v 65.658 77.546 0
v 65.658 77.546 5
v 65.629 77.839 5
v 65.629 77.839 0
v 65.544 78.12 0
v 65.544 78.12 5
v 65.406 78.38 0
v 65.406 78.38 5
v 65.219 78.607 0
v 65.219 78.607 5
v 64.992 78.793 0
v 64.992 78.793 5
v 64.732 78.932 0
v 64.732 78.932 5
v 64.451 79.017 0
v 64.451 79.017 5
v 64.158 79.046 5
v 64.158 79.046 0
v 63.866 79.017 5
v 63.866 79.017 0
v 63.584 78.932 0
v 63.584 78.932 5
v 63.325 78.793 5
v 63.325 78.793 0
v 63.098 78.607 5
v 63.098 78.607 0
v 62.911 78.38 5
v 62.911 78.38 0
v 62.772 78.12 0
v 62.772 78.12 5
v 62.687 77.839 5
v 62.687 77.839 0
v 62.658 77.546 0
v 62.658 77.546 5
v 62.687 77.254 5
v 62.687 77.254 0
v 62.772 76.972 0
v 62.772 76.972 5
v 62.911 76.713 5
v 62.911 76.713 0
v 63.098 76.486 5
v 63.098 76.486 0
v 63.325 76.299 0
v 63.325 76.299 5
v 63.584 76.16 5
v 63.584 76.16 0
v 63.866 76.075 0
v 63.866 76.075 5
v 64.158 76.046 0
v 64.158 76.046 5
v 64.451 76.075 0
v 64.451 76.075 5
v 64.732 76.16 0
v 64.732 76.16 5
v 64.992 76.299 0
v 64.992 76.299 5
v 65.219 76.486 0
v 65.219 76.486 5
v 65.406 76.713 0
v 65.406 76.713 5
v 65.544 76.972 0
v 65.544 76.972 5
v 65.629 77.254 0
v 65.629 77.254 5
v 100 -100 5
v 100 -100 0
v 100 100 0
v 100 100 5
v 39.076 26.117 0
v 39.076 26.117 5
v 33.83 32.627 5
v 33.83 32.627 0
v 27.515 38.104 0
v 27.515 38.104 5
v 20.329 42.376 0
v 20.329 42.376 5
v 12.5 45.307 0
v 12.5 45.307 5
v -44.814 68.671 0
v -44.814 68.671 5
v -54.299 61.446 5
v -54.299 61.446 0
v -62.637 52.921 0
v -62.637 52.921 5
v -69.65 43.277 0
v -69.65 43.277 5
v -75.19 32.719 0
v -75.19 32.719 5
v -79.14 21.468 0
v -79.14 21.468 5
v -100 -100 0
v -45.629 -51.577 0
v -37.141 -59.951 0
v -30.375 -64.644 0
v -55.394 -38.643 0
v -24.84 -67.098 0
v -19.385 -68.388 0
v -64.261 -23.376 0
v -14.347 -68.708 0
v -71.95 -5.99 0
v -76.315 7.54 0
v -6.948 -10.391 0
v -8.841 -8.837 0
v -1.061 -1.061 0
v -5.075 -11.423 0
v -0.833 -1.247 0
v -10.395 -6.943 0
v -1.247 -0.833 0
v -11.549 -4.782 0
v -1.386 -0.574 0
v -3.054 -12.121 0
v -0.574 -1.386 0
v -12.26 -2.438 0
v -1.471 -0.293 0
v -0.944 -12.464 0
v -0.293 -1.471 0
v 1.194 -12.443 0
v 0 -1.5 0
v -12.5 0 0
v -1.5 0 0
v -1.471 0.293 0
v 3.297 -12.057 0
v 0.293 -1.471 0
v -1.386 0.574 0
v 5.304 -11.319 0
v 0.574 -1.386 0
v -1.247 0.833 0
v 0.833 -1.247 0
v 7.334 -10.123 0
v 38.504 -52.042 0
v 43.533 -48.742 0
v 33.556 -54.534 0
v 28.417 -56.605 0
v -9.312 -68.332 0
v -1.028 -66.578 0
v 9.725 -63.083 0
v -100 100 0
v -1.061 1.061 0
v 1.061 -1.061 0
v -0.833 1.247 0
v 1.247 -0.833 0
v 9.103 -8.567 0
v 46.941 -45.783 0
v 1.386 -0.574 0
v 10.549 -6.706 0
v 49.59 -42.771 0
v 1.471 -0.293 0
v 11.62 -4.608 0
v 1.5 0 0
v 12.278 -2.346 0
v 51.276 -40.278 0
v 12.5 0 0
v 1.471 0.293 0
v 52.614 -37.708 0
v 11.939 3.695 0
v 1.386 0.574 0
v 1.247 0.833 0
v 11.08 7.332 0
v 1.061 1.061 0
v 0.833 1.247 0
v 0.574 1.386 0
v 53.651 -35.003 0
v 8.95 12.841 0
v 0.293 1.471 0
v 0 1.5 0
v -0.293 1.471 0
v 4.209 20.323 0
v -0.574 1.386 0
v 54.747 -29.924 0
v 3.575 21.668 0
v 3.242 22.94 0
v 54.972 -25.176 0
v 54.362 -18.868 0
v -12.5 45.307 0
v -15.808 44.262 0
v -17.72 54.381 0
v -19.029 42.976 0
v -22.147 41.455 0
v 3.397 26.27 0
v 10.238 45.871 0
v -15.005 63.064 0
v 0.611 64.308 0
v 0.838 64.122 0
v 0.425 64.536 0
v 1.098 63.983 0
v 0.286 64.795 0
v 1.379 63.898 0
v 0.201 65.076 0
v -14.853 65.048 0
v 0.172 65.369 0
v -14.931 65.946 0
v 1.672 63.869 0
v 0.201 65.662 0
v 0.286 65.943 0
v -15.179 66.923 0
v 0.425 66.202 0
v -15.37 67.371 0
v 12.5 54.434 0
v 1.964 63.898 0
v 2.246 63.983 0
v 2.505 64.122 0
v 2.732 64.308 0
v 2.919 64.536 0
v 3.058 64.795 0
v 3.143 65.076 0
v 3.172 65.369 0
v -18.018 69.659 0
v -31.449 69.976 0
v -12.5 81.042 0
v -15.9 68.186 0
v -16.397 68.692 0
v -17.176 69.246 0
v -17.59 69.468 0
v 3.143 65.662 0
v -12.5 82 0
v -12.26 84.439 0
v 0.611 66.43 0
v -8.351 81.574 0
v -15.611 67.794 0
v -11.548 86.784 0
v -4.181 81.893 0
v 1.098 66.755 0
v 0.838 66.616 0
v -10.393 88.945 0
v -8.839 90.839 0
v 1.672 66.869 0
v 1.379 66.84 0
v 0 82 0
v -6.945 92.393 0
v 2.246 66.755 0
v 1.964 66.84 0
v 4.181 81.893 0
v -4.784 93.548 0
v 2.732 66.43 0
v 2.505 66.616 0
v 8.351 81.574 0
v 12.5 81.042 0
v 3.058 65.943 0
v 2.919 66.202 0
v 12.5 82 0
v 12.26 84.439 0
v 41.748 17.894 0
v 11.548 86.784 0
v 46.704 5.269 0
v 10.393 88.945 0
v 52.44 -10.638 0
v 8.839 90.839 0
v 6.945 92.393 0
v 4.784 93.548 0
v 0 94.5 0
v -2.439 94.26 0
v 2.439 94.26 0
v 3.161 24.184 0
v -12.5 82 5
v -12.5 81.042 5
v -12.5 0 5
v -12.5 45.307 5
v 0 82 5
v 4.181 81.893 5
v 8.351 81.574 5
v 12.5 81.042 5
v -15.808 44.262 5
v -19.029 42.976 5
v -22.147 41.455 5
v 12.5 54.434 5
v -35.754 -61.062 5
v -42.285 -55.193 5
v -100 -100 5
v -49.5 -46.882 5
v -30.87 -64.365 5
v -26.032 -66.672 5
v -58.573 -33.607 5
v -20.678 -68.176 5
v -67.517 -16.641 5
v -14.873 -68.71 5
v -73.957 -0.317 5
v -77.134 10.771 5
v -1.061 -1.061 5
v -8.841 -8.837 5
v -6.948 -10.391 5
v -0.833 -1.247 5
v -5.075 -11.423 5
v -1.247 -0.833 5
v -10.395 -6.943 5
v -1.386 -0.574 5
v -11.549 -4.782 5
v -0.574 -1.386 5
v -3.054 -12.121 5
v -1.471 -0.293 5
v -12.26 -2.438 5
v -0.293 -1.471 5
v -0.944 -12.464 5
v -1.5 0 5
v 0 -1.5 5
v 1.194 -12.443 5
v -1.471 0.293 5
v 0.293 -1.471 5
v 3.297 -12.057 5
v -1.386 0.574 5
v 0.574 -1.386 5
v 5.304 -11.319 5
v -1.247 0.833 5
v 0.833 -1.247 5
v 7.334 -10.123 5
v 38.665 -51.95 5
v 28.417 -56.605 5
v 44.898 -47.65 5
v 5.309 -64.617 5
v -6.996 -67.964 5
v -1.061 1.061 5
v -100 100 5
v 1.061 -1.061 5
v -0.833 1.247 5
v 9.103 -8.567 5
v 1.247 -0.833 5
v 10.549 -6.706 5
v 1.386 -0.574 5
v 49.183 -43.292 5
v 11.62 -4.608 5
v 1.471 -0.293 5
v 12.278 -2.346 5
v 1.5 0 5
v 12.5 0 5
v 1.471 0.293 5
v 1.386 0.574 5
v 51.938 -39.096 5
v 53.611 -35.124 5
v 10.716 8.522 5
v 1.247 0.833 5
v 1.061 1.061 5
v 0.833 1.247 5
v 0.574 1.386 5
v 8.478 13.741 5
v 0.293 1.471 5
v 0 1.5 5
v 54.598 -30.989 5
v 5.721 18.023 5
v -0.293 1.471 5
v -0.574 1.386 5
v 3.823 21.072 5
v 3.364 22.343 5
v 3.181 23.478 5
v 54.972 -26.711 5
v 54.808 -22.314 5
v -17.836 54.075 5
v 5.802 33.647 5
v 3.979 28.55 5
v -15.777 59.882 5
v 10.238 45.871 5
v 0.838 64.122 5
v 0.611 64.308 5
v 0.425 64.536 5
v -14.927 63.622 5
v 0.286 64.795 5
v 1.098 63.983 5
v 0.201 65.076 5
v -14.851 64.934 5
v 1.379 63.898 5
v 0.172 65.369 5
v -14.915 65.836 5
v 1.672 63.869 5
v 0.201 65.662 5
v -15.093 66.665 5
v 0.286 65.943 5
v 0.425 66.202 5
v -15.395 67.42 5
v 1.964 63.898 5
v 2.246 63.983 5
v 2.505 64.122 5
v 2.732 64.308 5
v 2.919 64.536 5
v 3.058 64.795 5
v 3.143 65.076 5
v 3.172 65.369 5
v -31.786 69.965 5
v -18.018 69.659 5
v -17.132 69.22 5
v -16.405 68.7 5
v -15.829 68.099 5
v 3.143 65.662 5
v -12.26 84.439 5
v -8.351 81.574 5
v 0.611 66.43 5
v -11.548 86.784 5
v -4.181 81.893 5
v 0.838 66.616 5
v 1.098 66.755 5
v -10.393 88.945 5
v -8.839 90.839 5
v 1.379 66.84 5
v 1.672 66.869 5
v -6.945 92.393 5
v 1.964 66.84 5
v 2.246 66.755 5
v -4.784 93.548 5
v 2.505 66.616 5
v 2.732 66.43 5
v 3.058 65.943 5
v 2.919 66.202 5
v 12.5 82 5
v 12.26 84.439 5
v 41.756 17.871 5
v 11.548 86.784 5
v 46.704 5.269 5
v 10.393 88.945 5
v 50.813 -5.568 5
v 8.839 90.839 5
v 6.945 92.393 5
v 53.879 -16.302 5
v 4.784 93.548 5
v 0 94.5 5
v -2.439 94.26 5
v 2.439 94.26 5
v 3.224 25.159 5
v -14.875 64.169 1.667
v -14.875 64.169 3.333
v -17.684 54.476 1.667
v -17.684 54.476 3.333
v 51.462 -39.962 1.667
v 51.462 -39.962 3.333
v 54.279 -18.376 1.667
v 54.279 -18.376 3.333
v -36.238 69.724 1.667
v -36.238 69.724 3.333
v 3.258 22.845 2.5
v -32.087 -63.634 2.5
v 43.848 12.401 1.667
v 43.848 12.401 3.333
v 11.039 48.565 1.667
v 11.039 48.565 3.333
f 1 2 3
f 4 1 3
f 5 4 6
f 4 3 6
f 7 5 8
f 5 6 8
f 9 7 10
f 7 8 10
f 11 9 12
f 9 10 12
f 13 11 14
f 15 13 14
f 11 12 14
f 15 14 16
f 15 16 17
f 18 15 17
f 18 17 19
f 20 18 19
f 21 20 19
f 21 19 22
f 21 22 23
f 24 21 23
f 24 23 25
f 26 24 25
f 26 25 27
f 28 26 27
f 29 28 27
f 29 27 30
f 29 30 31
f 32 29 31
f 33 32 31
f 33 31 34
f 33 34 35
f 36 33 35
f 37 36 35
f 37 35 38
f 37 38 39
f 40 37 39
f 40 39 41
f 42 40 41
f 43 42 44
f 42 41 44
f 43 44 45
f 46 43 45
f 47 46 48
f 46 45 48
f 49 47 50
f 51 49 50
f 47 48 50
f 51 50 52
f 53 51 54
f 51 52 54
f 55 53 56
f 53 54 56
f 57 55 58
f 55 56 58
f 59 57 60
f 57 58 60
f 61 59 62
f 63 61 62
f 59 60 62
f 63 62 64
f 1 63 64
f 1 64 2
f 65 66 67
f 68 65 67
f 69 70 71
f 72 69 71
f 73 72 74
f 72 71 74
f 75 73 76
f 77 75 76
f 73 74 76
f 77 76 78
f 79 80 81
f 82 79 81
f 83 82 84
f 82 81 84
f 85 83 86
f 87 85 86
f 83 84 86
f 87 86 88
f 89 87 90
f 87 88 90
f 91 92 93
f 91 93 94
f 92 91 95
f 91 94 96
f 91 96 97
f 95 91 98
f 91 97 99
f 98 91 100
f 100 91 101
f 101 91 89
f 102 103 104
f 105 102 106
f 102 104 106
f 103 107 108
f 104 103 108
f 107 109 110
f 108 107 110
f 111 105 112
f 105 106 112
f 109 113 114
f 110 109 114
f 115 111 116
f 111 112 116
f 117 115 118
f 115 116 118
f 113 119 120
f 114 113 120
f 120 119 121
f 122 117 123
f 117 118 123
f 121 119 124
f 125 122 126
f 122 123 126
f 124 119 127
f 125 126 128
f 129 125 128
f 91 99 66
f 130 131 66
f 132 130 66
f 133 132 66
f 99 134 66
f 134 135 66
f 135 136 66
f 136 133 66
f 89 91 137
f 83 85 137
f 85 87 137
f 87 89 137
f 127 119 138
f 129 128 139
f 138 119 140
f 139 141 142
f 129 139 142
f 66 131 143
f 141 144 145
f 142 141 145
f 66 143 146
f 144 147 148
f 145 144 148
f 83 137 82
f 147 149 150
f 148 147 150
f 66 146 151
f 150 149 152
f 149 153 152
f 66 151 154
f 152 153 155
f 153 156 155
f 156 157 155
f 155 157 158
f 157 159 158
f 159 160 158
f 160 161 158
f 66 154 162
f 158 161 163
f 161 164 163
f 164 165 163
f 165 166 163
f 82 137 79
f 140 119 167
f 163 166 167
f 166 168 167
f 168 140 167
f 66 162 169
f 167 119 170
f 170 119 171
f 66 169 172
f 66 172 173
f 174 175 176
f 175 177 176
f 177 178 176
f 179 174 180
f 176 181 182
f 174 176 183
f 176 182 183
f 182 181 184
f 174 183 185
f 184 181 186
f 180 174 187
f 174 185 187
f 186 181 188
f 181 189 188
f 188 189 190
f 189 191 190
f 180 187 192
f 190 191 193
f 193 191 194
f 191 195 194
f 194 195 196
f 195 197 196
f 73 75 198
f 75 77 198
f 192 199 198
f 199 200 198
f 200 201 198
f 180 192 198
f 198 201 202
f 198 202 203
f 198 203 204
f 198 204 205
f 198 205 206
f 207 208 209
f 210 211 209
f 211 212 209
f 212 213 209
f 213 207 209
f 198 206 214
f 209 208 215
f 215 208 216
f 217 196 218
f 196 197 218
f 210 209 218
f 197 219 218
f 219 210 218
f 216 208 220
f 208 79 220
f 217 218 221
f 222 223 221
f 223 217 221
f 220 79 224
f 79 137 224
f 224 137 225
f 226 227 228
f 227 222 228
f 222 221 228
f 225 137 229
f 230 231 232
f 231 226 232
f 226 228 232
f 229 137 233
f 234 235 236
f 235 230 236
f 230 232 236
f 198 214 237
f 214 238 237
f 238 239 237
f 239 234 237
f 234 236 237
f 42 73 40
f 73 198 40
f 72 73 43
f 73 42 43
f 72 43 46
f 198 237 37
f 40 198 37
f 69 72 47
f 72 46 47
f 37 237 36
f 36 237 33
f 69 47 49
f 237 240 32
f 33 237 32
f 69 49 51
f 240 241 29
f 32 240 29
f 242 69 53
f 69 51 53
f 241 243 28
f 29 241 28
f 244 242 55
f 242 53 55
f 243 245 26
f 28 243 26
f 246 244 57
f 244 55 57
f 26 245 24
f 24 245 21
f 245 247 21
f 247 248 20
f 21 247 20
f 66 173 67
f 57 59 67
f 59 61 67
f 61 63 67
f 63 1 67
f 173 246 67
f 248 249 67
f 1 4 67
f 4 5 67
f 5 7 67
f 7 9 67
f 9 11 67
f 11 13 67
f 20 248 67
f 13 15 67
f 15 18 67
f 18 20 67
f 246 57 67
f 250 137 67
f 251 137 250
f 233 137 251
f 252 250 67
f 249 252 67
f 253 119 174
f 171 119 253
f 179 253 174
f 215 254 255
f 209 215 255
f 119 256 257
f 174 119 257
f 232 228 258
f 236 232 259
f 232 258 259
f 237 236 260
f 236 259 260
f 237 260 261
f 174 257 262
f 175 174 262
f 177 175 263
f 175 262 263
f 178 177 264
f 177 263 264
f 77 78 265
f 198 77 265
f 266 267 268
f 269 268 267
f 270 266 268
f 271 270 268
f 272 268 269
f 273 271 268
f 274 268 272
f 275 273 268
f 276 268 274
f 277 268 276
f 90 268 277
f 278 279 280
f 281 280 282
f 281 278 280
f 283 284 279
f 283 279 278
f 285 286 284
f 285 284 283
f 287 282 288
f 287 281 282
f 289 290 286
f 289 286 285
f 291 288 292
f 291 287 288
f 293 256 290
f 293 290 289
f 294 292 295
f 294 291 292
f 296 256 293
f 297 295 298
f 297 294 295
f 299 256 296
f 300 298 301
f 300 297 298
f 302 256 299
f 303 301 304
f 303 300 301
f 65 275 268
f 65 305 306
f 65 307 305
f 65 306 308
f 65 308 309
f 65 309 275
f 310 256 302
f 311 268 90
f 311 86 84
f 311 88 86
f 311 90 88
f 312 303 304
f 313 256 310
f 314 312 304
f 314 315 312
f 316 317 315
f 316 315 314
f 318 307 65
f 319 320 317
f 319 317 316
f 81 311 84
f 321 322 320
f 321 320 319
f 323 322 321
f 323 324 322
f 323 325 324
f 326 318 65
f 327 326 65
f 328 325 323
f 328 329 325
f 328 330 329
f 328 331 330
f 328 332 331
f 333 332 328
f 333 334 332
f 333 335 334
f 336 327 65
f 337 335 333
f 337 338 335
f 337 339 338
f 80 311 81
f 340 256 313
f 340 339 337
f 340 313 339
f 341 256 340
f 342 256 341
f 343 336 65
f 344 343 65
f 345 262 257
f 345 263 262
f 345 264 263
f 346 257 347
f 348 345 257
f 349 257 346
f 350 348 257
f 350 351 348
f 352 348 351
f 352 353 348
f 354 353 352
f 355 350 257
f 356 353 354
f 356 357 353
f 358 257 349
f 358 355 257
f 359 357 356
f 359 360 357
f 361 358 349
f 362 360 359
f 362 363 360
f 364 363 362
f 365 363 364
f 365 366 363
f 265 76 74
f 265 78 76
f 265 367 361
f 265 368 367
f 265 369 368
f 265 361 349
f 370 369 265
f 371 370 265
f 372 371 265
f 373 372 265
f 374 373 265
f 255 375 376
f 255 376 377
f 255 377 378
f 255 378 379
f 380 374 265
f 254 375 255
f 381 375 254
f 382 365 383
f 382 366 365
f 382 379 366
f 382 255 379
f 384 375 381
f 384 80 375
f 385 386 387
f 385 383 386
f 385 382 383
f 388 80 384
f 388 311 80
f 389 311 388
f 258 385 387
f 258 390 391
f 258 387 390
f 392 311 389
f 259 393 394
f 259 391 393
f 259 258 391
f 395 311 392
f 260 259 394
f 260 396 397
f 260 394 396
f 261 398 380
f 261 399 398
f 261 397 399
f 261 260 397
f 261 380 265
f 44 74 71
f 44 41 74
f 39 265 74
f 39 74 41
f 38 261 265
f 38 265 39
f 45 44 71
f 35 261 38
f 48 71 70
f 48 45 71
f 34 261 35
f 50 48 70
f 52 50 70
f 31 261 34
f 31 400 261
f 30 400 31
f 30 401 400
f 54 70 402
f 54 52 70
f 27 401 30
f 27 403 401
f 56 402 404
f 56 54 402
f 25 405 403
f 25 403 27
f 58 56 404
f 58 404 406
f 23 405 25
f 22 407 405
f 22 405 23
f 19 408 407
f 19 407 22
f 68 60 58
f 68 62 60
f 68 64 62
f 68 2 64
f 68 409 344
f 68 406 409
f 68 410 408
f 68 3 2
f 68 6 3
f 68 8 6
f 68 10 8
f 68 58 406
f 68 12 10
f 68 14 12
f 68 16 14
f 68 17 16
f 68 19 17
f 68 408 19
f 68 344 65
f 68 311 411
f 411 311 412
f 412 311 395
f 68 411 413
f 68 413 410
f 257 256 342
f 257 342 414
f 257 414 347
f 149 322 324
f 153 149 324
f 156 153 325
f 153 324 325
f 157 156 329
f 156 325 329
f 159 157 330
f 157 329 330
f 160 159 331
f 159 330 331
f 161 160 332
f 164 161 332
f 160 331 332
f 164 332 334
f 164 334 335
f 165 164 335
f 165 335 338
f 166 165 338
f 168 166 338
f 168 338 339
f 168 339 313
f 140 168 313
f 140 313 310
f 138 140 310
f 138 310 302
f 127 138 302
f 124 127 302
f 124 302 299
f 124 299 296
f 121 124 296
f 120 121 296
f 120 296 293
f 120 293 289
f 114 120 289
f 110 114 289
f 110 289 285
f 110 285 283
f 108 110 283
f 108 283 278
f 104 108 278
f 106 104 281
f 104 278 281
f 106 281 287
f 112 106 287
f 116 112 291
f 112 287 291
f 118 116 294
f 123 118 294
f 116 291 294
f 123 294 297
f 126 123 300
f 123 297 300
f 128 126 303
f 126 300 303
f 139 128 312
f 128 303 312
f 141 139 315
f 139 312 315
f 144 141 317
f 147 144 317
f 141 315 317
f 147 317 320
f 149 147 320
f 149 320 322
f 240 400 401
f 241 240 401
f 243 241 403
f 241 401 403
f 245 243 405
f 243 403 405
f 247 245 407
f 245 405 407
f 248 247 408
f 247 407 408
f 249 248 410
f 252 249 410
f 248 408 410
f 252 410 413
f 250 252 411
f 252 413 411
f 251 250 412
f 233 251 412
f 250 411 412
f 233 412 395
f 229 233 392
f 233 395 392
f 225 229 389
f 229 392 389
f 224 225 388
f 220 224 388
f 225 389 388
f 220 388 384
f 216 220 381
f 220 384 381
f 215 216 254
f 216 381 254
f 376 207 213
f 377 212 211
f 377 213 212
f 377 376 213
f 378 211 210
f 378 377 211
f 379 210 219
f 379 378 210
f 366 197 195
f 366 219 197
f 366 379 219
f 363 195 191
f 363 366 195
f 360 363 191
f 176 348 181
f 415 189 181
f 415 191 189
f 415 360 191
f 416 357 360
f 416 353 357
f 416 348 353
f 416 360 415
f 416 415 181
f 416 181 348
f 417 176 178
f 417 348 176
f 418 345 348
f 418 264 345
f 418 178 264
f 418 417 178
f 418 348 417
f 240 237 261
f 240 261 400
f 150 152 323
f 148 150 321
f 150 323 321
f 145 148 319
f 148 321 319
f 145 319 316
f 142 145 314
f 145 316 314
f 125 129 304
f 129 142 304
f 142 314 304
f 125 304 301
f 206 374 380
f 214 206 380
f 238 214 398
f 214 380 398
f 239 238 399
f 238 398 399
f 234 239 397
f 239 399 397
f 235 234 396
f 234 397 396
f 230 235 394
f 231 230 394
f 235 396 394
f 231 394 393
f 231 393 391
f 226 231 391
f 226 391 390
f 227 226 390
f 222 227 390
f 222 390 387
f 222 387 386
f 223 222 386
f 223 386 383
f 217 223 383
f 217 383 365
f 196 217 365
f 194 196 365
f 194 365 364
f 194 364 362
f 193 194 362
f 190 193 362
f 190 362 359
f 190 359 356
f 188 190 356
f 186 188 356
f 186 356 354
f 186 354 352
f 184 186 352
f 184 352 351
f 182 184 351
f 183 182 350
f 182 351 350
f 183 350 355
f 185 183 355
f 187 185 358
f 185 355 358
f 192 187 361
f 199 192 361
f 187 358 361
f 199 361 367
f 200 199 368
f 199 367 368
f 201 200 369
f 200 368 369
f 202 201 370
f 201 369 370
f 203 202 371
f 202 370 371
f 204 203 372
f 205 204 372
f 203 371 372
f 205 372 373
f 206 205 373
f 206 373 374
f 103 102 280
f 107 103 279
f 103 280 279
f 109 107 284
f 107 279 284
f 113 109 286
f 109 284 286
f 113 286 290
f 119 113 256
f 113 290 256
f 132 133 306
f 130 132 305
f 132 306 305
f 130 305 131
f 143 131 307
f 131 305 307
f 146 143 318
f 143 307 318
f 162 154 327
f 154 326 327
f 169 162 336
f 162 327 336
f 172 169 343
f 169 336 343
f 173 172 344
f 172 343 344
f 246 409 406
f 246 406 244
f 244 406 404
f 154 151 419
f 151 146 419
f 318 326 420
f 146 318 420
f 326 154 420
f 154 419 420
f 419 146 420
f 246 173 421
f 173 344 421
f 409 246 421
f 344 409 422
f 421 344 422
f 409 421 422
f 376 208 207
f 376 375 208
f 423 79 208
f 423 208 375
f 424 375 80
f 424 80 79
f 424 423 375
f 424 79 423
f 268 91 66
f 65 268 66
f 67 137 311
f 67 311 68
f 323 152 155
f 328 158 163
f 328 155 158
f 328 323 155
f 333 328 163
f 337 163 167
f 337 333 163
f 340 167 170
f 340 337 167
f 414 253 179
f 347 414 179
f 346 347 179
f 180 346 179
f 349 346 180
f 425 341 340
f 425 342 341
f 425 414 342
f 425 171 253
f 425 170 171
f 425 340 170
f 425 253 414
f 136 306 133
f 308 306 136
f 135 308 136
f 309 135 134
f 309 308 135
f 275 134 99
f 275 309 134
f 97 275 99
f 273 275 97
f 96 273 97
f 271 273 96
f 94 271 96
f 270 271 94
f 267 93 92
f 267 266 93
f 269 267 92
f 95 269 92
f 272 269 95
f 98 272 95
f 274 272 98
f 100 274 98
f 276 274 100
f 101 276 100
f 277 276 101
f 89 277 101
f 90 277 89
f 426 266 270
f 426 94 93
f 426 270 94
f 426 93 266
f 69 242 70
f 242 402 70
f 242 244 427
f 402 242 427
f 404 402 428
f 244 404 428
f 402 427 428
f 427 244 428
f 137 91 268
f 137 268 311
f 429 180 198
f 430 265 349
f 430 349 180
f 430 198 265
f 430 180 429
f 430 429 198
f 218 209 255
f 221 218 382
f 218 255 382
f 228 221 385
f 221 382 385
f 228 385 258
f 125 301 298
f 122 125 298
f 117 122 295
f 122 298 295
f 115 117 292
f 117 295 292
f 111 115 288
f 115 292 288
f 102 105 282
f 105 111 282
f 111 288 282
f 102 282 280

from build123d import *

# Parameters (mm, degrees)
F0_W     = 200
F0_H     = 200
F1_DEPTH = 5
F2_R     = 1.5
F3_DEPTH = 5.001
F4_R     = 1.5
F5_DEPTH = 5.001


# Not quite as in the source:
# - a feature names something its author has since deleted; it is built from what else it names


with BuildPart() as f1:
    # F0 (on Top) → F1 (new body)
    with BuildSketch(Plane.XY):
        Rectangle(F0_W, F0_H)
    extrude(amount=F1_DEPTH)

    # F2 (on face) → F3 (cut, through all)
    with BuildSketch(Plane.XY.offset(5)):
        Circle(F2_R)
        with Locations((0, -63.662)):
            Circle(F2_R)
        with Locations((64.1583176089, 77.5462182691)):
            Circle(F2_R)
        with Locations((-51.9230208324, 31.0114389966)):
            Circle(F2_R)
        with Locations((1.6717778053, 65.3690844774)):
            Circle(F2_R)
    extrude(amount=-F3_DEPTH, mode=Mode.SUBTRACT)

    # F4 (on face) → F5 (cut, through all)
    with BuildSketch(Plane.XY.offset(5)):
        with BuildLine():
            Line((-12.5, 0), (-12.5, 45.3072841826))
            ThreePointArc((-12.5, 45.3072841826), (-17.4301226021, 43.6484916816), (-22.1467463119, 41.4550555156))
            add(Edge.make_bspline(
                [(-22.1467463119, 41.4550555156), (-22.9092474685, 38.6087716354), (-26.7916480004, 19.492616055), (-18.2157949408, -4.2593218119), (-6.9475647742, -10.3914072054)],
                knots=[0.382428707, 0.382428707, 0.382428707, 0.382428707, 0.4580536444, 0.8659002673, 0.8659002673, 0.8659002673, 0.8659002673], degree=3))
            ThreePointArc((-6.9475647742, -10.3914072054), (-11.024848291, -5.8909014727), (-12.5, 0))
        make_face()
        with BuildLine():
            ThreePointArc((-44.8138332434, 68.6711027291), (-66.3187168056, 48.2268369402), (-79.1399512645, 21.4678390587))
            add(Edge.make_bspline(
                [(28.4173693508, -56.6046871245), (3.9913801126, -64.1205269264), (-32.503865236, -87.7373972459), (-75.0211054276, -9.8932929428), (-79.1399512645, 21.4678390587)],
                knots=[0, 0, 0, 0, 0.2921661902, 0.6142842516, 0.6142842516, 0.6142842516, 0.6142842516], degree=3))
            add(Edge.make_bspline(
                [(28.4173693508, -56.6046871245), (64.8528327163, -43.3941669474), (56.1975225425, -18.4447190671), (46.7037719975, 5.2685558936)],
                knots=[0, 0, 0, 0, 0.1772966077, 0.1772966077, 0.1772966077, 0.1772966077], degree=3))
            ThreePointArc((46.7037719975, 5.2685558936), (46.9258845622, 2.6384385644), (47, 0))
            ThreePointArc((47, 0), (-24.1671566733, -40.310650433), (-22.1467463119, 41.4550555156))
            add(Edge.make_bspline(
                [(-18.0183753353, 69.6594335387), (-10.4657655575, 66.5625813654), (-18.2908445233, 55.8484646377), (-22.1467463119, 41.4550555156)],
                knots=[0, 0, 0, 0, 0.382428707, 0.382428707, 0.382428707, 0.382428707], degree=3))
            add(Edge.make_bspline(
                [(-44.8138332434, 68.6711027291), (-36.4977633391, 70.1220717043), (-27.3217936199, 70.3416004143), (-18.0183753353, 69.6594335387)],
                knots=[0.898151434, 0.898151434, 0.898151434, 0.898151434, 1, 1, 1, 1], degree=3))
        make_face()
        with Locations((0, -63.662)):
            Circle(F4_R, mode=Mode.SUBTRACT)
        with Locations((-51.9230208324, 31.0114389966)):
            Circle(F4_R, mode=Mode.SUBTRACT)
        with BuildLine():
            add(Edge.make_bspline(
                [(46.7037719975, 5.2685558936), (43.8279453898, 12.4517304214), (40.8751841388, 19.5214746733), (39.0755044059, 26.1171391125)],
                knots=[0.1772966077, 0.1772966077, 0.1772966077, 0.1772966077, 0.2310029169, 0.2310029169, 0.2310029169, 0.2310029169], degree=3))
            ThreePointArc((39.0755044059, 26.1171391125), (27.5149701187, 38.1041522589), (12.5, 45.3072841826))
            Line((12.5, 45.3072841826), (12.5, 0))
            ThreePointArc((12.5, 0), (10.548673601, -6.7063764627), (5.3039223586, -11.318940216))
            ThreePointArc((5.3039223586, -11.318940216), (-0.9436468985, -12.4643303282), (-6.9475647742, -10.3914072054))
            add(Edge.make_bspline(
                [(-22.1467463119, 41.4550555156), (-22.9092474685, 38.6087716354), (-26.7916480004, 19.492616055), (-18.2157949408, -4.2593218119), (-6.9475647742, -10.3914072054)],
                knots=[0.382428707, 0.382428707, 0.382428707, 0.382428707, 0.4580536444, 0.8659002673, 0.8659002673, 0.8659002673, 0.8659002673], degree=3))
            ThreePointArc((-22.1467463119, 41.4550555156), (-24.1671566733, -40.310650433), (47, 0))
            ThreePointArc((47, 0), (46.9258845622, 2.6384385644), (46.7037719975, 5.2685558936))
        make_face()
        with BuildLine():
            Line((12.5, 0), (12.5, 45.3072841826))
            ThreePointArc((12.5, 45.3072841826), (11.372638641, 45.6033232379), (10.2382828633, 45.8713152636))
            add(Edge.make_bspline(
                [(12.5, 0), (10.6902167617, 15.518115425), (-2.0681567086, 20.0495964199), (6.7073533039, 34.5490943361), (10.2382828633, 45.8713152636)],
                knots=[0, 0, 0, 0, 0.4638904895, 0.8993636987, 0.8993636987, 0.8993636987, 0.8993636987], degree=3))
        make_face()
        with BuildLine():
            Line((12.5, 45.3072841826), (12.5, 54.4343143702))
            add(Edge.make_bspline(
                [(10.2382828633, 45.8713152636), (11.0542680571, 48.4878400289), (11.8318981736, 51.3340910932), (12.5, 54.4343143702)],
                knots=[0.8993636987, 0.8993636987, 0.8993636987, 0.8993636987, 1, 1, 1, 1], degree=3))
            ThreePointArc((10.2382828633, 45.8713152636), (11.372638641, 45.6033232379), (12.5, 45.3072841826))
        make_face()
        with BuildLine():
            Line((-12.5, 82), (-12.5, 81.0416559554))
            ThreePointArc((-12.5, 81.0416559554), (-6.2683415531, 81.7600629536), (0, 82))
            ThreePointArc((0, 82), (6.2683415531, 81.7600629536), (12.5, 81.0416559554))
            Line((12.5, 81.0416559554), (12.5, 82))
            ThreePointArc((12.5, 82), (0, 94.5), (-12.5, 82))
        make_face()
    extrude(amount=-F5_DEPTH, mode=Mode.SUBTRACT)


solid = f1.part
